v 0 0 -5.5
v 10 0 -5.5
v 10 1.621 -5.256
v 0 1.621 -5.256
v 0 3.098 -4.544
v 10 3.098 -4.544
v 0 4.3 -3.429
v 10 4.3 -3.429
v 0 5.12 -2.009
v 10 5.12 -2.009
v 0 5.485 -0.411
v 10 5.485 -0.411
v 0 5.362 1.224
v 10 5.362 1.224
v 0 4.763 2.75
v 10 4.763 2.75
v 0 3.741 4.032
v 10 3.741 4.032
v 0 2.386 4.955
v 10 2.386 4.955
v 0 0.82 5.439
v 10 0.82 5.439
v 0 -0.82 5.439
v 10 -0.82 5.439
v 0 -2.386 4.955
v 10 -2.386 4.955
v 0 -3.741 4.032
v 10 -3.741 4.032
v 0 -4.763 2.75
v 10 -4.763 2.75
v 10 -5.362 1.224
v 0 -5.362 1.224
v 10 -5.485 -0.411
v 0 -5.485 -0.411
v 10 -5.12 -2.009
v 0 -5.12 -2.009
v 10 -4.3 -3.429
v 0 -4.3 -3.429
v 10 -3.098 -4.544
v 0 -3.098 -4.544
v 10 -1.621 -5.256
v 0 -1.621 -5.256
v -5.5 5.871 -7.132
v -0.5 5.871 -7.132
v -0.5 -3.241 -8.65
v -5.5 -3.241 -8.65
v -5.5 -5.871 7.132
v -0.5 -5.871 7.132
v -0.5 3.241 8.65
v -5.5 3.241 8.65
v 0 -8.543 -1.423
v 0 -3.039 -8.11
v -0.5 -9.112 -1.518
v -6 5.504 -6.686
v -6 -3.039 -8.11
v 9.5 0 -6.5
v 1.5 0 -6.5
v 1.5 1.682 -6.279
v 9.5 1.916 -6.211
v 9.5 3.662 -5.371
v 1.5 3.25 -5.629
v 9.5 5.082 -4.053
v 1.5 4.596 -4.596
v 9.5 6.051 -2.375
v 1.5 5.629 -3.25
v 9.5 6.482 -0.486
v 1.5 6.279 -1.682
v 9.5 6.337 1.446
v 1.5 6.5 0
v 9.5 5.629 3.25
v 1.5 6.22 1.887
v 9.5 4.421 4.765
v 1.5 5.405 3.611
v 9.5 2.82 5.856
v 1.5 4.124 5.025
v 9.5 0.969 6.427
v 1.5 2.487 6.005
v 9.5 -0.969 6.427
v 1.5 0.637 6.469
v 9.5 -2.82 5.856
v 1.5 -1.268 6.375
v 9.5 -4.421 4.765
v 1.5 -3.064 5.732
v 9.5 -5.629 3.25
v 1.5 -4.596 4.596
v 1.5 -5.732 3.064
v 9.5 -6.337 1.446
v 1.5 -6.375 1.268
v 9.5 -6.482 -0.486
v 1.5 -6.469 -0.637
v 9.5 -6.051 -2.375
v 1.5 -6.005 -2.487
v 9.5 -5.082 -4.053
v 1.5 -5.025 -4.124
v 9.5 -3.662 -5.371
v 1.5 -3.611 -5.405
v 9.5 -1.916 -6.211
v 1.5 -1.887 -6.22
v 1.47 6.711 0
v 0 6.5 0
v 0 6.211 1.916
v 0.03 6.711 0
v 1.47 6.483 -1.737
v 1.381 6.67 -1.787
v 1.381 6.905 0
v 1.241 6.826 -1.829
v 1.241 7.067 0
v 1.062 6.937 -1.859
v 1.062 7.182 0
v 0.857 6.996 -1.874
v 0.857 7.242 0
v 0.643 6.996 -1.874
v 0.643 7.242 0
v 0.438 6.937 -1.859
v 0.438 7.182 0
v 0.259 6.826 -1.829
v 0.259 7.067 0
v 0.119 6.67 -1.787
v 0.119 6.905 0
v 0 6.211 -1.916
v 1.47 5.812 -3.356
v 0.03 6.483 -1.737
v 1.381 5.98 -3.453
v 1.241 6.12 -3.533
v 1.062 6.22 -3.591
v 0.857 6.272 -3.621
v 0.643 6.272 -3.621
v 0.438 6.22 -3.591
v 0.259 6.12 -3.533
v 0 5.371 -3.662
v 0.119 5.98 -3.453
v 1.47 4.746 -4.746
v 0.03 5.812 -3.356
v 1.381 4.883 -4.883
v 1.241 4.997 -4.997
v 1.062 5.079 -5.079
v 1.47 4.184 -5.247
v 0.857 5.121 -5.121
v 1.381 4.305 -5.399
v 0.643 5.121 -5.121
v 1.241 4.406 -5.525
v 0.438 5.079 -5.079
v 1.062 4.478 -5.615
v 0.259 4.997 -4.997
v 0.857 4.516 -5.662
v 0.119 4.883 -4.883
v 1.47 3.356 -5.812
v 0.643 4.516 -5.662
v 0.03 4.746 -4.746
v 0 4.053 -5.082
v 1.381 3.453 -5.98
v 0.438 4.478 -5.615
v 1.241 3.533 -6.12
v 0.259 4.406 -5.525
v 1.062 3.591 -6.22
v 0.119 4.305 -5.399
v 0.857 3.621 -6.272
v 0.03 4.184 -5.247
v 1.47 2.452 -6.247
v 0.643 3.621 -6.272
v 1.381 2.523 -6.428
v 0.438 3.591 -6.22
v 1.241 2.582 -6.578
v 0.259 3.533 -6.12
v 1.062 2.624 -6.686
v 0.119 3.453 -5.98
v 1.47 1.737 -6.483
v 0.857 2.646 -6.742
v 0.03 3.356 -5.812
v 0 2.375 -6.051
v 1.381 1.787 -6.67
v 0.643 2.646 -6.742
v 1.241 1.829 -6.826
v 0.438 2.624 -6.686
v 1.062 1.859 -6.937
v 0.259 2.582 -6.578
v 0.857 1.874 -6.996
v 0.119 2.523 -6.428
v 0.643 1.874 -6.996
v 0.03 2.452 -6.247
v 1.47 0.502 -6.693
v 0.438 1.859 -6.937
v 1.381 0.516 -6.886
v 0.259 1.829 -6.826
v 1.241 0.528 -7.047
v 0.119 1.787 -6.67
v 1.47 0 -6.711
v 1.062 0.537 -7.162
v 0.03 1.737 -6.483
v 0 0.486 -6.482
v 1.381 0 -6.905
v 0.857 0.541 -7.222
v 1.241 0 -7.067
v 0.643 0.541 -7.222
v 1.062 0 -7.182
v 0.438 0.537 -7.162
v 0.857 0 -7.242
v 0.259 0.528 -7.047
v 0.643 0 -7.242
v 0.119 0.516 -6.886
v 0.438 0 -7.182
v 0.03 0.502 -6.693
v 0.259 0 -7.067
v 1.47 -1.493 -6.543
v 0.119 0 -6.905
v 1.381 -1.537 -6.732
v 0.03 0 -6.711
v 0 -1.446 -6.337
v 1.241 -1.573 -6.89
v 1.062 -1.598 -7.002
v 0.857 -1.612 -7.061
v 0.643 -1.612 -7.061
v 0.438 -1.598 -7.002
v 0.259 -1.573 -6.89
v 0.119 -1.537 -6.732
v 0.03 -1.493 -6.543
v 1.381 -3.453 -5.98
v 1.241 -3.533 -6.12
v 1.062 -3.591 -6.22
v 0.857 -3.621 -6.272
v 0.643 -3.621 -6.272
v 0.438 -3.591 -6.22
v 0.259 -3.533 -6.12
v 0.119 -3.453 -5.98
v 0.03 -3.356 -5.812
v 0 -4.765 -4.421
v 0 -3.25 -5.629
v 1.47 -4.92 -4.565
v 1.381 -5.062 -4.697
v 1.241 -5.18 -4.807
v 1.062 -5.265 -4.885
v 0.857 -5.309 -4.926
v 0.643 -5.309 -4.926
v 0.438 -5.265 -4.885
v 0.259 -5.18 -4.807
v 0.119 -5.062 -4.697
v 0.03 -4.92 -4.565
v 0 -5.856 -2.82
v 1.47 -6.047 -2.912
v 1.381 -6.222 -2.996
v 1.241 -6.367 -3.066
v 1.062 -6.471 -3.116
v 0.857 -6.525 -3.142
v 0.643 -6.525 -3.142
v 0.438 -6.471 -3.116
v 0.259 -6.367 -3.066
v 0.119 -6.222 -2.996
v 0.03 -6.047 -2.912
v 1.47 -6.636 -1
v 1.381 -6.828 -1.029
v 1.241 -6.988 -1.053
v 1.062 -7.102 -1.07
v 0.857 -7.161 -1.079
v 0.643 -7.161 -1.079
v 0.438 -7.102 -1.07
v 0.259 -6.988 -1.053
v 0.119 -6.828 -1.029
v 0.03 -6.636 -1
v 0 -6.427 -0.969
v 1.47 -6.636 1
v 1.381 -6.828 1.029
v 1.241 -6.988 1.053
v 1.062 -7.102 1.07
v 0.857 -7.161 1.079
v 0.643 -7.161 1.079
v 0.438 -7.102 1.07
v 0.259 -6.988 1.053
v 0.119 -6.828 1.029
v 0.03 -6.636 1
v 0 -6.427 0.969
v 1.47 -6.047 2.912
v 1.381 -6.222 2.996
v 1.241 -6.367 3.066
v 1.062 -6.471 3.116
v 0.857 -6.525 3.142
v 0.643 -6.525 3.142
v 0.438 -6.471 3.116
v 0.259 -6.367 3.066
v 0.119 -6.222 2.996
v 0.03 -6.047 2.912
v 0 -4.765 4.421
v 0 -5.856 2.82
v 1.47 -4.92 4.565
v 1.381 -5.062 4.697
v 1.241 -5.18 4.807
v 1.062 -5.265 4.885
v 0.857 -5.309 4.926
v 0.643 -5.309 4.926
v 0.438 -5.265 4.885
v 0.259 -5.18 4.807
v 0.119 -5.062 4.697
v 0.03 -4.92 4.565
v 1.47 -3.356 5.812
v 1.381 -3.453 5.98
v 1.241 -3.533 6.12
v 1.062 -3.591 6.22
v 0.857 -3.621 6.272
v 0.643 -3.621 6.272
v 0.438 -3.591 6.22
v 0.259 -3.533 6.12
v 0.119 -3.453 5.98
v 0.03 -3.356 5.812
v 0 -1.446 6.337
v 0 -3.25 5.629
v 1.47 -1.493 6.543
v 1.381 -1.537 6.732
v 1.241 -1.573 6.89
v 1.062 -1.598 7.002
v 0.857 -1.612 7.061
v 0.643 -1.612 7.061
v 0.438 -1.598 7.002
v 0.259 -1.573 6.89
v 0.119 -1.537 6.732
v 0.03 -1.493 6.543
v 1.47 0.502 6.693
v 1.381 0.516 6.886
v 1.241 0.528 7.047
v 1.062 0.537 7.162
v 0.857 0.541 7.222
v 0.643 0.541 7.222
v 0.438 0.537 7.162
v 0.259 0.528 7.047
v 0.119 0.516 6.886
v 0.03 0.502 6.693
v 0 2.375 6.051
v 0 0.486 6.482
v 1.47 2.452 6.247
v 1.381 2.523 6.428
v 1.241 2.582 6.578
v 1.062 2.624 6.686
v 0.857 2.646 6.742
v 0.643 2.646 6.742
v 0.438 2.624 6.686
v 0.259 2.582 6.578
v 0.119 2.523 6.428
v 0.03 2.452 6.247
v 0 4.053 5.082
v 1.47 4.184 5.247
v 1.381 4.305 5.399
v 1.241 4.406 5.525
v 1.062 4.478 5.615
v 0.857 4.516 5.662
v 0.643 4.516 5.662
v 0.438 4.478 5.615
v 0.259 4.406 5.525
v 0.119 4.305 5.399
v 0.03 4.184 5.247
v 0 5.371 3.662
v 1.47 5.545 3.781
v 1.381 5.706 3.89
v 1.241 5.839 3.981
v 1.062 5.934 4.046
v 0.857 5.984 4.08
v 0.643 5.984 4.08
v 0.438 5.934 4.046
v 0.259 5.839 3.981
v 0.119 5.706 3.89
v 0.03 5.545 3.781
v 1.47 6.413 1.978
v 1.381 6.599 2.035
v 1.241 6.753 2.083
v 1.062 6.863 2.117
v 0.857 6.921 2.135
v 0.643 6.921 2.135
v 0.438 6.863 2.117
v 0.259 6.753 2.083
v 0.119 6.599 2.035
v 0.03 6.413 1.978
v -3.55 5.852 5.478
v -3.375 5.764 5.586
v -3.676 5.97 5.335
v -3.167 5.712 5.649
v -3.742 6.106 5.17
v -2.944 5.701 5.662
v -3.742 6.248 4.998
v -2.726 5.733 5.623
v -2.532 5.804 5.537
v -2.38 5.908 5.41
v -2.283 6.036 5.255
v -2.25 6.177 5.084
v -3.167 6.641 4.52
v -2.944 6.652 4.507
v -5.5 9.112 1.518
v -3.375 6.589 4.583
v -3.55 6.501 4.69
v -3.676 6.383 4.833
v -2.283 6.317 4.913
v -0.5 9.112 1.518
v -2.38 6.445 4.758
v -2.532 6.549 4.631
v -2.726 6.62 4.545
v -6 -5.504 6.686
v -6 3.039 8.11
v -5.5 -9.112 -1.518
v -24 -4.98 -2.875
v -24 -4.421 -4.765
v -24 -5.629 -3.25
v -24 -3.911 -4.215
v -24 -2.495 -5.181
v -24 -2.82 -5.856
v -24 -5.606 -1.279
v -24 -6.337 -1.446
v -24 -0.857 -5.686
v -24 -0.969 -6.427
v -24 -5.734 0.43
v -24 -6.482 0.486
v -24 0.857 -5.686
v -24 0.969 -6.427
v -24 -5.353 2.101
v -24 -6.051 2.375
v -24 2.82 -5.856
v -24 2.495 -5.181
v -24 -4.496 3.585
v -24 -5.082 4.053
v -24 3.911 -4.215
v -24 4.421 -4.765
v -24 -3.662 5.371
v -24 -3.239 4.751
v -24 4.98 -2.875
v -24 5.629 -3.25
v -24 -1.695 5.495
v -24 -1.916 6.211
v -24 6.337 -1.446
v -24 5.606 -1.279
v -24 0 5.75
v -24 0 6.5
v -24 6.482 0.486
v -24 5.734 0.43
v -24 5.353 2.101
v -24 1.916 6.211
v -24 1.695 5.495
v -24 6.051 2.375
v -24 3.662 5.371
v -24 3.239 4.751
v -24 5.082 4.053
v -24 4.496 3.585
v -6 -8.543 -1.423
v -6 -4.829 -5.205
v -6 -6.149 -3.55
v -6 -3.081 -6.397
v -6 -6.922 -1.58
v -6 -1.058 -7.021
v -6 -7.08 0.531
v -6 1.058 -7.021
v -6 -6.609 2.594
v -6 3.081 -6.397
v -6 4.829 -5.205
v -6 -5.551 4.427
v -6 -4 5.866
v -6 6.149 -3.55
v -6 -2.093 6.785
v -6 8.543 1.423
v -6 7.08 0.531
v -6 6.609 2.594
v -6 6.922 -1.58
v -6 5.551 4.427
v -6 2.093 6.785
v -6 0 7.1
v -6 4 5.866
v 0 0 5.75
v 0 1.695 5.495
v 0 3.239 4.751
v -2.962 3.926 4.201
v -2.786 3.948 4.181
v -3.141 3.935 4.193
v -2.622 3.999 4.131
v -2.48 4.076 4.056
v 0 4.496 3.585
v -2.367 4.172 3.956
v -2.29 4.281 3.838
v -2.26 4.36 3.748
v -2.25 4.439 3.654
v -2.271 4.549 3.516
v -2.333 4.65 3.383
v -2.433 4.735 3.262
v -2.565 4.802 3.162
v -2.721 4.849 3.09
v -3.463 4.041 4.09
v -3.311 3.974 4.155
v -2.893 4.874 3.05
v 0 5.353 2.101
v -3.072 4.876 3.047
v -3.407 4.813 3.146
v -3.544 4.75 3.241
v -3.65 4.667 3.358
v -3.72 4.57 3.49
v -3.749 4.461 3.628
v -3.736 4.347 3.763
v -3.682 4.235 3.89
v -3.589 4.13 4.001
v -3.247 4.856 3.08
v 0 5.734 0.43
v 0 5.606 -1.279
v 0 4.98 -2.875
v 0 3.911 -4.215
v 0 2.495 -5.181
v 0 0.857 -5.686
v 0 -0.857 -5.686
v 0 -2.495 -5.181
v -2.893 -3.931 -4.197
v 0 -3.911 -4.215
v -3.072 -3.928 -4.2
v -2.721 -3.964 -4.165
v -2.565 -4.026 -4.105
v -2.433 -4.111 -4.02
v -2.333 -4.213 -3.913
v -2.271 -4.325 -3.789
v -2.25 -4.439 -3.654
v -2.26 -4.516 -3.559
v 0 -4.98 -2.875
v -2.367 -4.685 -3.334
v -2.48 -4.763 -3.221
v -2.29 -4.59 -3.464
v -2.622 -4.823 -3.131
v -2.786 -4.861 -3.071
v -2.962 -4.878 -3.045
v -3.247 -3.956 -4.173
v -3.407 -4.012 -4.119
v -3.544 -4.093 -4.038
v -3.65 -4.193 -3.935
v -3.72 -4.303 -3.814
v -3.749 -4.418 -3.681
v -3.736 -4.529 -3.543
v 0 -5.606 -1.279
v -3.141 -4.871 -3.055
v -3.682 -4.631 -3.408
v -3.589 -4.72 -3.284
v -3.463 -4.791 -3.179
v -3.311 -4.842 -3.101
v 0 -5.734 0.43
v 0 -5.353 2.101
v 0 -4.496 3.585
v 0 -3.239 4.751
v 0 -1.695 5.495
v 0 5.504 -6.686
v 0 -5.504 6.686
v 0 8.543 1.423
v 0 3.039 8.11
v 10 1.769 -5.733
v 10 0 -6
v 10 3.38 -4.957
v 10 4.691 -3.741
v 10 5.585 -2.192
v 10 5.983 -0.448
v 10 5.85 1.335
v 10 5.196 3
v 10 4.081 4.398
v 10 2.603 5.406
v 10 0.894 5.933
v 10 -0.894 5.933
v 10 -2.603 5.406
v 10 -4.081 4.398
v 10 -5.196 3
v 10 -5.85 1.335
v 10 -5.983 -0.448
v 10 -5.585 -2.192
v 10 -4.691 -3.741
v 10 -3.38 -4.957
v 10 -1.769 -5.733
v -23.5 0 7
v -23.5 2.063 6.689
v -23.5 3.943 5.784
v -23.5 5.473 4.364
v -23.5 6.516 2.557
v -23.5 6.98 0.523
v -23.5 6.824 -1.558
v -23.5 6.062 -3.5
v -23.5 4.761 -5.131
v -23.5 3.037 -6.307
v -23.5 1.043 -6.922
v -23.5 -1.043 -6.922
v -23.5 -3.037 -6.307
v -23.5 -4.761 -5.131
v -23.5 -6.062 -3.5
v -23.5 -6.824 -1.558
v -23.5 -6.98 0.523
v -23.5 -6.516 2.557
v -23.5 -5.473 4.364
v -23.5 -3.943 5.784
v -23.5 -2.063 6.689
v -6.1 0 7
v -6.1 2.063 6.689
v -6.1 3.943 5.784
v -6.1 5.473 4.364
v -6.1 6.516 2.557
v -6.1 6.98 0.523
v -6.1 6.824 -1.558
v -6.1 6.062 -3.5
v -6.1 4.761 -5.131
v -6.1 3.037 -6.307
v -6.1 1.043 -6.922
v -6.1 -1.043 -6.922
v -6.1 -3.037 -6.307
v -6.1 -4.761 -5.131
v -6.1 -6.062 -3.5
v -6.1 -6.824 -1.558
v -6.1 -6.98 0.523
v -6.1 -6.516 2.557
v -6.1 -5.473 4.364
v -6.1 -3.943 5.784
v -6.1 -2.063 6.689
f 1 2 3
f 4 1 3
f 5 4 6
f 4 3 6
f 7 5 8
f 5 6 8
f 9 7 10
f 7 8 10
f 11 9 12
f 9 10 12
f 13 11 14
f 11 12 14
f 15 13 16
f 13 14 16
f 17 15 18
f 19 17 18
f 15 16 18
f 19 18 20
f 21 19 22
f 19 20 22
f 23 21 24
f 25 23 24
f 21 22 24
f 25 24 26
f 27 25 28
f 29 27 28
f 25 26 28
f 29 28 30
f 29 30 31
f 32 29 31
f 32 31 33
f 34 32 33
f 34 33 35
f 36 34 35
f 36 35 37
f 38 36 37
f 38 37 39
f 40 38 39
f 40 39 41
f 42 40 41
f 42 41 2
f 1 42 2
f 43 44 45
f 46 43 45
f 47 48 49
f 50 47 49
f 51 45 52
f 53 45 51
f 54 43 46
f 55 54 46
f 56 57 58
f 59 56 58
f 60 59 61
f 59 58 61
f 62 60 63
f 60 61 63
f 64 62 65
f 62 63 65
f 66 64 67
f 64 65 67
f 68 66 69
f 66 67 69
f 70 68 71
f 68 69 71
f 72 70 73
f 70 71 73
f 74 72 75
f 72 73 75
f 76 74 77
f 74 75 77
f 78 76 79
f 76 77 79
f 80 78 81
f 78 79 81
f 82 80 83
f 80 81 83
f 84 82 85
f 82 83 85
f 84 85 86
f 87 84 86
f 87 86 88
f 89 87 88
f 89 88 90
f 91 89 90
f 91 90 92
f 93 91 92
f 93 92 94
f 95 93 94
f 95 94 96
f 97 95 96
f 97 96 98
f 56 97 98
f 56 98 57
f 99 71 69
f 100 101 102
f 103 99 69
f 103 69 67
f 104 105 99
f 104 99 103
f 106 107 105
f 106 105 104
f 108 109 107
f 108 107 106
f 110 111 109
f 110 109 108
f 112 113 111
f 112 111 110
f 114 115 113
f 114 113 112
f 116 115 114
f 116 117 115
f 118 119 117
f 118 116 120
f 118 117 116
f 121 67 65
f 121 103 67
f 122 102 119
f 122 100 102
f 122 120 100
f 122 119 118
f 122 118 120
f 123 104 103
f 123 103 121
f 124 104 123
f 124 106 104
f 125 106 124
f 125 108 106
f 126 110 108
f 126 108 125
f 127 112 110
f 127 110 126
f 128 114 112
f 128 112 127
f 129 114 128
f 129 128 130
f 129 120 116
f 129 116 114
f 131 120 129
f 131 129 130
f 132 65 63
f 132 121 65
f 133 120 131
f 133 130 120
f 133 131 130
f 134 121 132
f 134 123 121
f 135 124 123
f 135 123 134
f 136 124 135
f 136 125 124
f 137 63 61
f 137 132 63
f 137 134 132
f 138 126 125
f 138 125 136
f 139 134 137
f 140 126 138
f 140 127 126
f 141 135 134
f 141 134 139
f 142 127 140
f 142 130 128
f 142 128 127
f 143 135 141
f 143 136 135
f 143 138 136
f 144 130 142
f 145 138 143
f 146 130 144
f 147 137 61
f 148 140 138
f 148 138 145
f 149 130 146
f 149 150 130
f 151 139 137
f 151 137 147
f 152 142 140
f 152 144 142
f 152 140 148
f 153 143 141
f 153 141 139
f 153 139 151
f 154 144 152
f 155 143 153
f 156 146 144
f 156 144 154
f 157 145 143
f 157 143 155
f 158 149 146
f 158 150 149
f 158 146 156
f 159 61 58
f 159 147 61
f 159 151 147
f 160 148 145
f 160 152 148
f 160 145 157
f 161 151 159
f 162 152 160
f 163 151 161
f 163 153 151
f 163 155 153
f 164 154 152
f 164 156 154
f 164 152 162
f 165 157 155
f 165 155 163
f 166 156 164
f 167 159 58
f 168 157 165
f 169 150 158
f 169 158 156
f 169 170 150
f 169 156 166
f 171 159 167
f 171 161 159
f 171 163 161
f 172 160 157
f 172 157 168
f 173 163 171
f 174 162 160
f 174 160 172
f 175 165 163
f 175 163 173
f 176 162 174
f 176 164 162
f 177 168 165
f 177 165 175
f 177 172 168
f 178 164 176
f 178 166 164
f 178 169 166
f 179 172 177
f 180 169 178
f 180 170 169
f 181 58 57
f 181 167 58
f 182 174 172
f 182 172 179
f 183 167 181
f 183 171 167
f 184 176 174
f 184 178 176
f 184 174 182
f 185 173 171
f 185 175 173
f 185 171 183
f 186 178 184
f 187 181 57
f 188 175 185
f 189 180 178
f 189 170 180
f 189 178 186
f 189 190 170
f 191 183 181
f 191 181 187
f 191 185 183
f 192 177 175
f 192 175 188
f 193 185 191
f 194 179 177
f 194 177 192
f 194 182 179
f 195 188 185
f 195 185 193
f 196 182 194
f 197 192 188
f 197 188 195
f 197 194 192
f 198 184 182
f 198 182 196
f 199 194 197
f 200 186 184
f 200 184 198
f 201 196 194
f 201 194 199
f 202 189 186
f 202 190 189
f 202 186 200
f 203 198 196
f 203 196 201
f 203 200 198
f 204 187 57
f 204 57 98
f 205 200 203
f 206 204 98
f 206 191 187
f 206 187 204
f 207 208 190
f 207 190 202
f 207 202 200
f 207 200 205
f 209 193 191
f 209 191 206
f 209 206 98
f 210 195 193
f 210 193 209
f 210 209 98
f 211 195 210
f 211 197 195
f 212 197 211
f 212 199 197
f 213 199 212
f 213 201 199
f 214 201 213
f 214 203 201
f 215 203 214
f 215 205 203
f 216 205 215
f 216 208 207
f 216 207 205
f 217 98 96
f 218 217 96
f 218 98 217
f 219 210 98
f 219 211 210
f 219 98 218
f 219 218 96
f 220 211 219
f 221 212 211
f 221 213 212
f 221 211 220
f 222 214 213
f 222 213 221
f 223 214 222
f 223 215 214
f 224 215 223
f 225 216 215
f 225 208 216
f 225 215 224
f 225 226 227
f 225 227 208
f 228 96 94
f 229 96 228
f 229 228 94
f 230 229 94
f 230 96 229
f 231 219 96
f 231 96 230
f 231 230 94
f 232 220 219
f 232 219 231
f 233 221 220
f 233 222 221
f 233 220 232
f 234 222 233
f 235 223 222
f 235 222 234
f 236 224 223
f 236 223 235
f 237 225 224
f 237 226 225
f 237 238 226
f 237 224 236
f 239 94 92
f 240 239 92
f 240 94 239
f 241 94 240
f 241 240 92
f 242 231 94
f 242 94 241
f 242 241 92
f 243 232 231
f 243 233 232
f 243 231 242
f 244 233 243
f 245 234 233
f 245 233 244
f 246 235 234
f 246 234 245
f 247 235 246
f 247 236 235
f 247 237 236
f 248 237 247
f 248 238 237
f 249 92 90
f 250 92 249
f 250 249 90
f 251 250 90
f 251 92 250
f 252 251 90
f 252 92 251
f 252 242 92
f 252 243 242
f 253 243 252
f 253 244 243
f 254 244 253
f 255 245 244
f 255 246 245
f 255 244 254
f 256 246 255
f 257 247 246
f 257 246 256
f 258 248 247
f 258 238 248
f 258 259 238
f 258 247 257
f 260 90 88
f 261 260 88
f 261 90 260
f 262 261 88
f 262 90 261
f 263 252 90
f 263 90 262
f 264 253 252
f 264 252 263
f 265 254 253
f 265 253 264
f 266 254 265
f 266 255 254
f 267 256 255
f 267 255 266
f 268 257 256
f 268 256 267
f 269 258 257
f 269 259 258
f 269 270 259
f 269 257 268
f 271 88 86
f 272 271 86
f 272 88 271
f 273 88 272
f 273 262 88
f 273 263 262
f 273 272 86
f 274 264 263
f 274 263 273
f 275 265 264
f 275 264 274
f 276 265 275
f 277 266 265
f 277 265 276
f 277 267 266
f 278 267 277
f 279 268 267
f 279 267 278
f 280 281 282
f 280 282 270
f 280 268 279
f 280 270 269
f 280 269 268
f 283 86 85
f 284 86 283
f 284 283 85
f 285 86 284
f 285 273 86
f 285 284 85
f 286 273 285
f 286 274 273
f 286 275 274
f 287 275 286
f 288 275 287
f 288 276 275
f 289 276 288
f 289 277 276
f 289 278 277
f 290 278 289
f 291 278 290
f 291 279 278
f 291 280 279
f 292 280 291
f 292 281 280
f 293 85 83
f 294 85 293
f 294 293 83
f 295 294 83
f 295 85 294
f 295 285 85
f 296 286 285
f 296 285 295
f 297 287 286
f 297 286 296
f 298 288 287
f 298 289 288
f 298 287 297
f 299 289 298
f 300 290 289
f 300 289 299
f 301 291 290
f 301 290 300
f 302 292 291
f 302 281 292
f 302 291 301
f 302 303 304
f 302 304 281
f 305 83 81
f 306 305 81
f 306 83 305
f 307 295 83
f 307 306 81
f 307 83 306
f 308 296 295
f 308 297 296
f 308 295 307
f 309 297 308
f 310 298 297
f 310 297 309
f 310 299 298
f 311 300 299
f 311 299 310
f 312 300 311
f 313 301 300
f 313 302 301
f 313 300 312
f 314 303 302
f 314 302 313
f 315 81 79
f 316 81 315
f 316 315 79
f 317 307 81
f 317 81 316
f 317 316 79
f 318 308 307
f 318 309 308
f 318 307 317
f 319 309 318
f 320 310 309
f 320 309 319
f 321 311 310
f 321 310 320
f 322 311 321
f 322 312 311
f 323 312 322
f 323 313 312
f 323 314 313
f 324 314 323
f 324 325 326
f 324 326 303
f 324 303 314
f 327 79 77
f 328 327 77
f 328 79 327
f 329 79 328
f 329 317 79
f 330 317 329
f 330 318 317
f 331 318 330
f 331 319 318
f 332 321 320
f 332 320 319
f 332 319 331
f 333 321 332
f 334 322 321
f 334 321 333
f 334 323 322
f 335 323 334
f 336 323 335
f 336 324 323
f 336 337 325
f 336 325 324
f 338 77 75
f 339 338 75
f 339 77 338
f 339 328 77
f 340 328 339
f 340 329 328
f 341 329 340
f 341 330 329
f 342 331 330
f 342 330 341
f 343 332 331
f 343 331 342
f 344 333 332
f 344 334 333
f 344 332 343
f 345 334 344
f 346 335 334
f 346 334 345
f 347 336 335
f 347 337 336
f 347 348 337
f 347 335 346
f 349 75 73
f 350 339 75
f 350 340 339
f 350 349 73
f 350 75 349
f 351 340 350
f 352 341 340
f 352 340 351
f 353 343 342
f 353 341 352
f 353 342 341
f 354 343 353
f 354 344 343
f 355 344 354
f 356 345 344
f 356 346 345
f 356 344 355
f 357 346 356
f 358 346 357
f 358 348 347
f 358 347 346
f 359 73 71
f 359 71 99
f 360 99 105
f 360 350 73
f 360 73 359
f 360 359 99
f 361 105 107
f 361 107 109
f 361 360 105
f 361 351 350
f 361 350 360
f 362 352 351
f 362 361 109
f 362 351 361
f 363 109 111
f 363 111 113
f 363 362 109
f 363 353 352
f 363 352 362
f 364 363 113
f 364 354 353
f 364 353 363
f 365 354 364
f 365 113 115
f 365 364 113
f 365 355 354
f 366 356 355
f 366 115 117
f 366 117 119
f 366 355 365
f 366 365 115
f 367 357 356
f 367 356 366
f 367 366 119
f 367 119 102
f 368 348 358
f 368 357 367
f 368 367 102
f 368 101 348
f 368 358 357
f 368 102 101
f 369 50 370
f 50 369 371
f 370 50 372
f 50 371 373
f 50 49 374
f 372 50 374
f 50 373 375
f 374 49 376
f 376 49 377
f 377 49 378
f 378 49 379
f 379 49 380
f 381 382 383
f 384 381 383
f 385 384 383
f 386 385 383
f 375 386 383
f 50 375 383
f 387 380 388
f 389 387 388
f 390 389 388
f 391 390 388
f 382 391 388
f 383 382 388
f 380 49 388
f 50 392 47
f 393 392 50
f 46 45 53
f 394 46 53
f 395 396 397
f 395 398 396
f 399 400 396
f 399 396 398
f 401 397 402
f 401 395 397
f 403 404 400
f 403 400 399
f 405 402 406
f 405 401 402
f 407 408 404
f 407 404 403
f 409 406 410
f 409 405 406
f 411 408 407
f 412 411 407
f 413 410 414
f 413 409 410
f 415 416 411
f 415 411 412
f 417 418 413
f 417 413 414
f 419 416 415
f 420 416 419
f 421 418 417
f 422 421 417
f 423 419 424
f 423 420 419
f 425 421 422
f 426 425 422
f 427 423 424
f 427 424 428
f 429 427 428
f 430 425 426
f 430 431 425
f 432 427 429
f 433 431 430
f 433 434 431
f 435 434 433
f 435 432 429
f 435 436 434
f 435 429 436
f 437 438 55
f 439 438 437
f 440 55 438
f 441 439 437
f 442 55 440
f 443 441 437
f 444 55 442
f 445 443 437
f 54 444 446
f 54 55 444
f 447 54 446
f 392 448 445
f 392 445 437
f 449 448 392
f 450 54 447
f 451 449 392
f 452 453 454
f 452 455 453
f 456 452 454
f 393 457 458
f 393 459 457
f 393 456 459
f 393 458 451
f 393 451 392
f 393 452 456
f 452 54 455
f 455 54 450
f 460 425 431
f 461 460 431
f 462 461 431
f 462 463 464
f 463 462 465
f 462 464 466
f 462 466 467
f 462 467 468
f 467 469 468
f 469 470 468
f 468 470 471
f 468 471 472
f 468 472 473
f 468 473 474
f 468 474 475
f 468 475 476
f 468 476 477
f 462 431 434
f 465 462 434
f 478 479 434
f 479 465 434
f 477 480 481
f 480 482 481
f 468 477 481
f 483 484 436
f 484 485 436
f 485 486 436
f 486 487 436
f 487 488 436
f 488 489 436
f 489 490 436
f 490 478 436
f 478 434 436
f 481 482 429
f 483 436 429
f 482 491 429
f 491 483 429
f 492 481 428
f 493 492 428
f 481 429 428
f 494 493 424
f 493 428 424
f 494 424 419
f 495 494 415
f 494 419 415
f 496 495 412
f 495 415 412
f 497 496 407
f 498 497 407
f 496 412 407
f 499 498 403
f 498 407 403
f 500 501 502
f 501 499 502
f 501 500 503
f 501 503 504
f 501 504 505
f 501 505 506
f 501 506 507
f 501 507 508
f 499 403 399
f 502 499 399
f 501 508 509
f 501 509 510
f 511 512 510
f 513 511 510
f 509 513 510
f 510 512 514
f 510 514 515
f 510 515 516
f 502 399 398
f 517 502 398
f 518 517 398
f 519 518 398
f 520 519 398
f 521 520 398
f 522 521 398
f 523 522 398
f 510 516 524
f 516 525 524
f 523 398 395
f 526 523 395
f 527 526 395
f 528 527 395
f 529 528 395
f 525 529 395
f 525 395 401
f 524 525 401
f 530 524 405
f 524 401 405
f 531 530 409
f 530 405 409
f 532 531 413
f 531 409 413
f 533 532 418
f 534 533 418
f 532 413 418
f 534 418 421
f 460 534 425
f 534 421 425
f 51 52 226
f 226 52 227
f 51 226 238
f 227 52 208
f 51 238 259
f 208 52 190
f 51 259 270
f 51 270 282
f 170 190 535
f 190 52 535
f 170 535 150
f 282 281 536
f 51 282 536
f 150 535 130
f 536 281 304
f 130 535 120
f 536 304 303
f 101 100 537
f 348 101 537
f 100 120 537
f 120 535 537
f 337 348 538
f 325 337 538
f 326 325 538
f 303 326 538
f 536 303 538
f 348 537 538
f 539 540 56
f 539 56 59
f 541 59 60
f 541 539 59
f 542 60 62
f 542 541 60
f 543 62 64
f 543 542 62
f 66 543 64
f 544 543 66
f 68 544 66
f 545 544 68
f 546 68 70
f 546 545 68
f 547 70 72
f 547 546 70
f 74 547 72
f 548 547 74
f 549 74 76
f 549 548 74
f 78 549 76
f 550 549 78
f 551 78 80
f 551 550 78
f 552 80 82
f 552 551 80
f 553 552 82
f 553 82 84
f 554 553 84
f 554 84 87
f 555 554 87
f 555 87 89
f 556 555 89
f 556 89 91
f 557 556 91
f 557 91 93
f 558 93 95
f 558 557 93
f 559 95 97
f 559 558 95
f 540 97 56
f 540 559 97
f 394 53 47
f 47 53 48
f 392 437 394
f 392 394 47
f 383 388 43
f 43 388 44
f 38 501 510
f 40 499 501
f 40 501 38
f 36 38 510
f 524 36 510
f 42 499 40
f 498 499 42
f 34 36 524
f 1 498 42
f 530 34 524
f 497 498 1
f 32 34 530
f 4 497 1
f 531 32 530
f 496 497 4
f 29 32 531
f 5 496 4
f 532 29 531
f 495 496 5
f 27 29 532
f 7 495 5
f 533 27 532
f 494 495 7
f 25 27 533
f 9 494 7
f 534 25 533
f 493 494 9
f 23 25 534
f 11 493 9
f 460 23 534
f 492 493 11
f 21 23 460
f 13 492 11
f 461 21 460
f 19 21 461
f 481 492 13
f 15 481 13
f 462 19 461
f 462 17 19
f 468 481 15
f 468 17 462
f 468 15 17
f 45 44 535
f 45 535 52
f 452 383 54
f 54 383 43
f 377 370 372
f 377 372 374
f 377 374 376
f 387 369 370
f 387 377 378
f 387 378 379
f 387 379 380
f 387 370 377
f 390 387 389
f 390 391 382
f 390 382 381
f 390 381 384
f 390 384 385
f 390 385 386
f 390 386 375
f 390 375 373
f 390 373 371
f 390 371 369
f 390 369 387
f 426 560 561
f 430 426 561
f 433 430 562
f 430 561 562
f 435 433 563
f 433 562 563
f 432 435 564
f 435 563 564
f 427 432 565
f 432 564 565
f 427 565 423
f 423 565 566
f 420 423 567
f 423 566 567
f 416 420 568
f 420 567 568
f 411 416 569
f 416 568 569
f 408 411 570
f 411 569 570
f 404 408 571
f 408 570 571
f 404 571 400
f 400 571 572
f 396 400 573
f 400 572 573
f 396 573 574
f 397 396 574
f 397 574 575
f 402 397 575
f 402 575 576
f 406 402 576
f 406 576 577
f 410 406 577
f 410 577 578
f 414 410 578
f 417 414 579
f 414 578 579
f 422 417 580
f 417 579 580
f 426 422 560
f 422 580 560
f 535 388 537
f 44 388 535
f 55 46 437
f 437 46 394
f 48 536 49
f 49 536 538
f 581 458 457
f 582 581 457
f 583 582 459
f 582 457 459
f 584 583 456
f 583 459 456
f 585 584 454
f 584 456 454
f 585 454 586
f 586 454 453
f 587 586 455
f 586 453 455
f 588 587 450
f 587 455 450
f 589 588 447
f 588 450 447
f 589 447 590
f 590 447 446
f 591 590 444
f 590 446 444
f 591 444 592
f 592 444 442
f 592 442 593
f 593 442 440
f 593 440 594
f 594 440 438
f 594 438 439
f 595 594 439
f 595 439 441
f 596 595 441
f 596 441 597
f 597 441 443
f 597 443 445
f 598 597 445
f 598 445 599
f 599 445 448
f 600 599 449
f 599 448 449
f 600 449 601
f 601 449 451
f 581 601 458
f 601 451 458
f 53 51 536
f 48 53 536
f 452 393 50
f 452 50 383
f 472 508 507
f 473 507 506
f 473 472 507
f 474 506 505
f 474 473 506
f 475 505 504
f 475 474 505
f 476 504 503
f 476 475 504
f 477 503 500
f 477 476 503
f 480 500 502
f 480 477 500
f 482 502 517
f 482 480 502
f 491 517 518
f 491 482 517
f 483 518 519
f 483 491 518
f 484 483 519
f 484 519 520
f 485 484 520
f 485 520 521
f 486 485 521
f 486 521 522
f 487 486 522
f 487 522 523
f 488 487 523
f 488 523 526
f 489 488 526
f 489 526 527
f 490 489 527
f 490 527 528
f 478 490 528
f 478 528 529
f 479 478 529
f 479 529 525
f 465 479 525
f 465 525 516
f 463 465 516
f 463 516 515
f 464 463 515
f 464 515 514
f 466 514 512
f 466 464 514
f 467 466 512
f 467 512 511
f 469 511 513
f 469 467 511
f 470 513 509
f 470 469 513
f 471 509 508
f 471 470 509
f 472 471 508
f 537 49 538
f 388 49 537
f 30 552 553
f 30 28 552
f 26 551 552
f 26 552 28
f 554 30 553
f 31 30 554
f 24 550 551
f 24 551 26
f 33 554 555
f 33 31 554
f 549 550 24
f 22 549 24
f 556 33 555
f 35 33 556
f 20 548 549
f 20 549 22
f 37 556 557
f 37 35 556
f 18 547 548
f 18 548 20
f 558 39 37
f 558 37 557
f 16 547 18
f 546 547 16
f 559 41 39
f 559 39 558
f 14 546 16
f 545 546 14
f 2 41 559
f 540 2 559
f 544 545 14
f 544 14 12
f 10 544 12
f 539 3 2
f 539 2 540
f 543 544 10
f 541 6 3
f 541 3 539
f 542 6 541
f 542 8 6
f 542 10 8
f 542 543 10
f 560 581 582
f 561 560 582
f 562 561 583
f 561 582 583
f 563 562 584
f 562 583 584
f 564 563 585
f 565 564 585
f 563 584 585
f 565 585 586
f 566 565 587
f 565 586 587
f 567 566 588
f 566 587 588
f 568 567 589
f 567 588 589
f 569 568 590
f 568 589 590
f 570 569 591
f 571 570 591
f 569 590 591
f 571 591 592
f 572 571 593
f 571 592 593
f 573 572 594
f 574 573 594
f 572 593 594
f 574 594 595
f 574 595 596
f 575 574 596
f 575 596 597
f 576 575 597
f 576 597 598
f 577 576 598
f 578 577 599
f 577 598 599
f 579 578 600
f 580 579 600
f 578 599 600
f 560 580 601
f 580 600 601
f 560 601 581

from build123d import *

# Parameters (mm, degrees)
ESQUISSE1_R             = 0.65
BOSS_EXTRU_1_DEPTH      = 1
BOSS_EXTRU_2_DEPTH      = 0.6
ESQUISSE4_R             = 0.7
BOSS_EXTRU_3_DEPTH      = 1.8
CHANFREIN1_SIZE         = 0.05
CHANFREIN2_SIZE         = 0.05
ESQUISSE5_R             = 0.575
ENL_V_MAT_EXTRU_1_DEPTH = 2.4
ESQUISSE6_R             = 0.55
ENL_V_MAT_EXTRU_2_DEPTH = 2.4
CHANFREIN3_SIZE         = 0.05
CHANFREIN4_SIZE         = 0.05
CHANFREIN5_SIZE         = 0.01
ESQUISSE7_R             = 0.075
BOSS_EXTRU_4_DEPTH      = 1.5
ECHELLE1_SCALE          = 10


with BuildPart() as part:
    # Esquisse1 → Boss.-Extru.1 (new body)
    with BuildSketch(Plane(origin=(0, 0, 0), x_dir=(0, 0, -1), z_dir=(1, 0, 0))):
        Circle(ESQUISSE1_R)
    extrude(amount=BOSS_EXTRU_1_DEPTH)

    # Esquisse2 → Révolution1 (revolve)
    with BuildSketch(Plane.XY):
        with BuildLine():
            Line((0, 0.65), (0.15, 0.65))
            ThreePointArc((0.15, 0.65), (0.075, 0.725), (0, 0.65))
        make_face()
    revolve(axis=Axis((1, 0, 0), (-1, 0, 0)))

    # Esquisse3 → Boss.-Extru.2 (add)
    with BuildSketch(Plane.ZY):
        Polygon((0.713221279, -0.587067918), (0.86502637, 0.324133787), (0.151805091, 0.911201705), (-0.713221279, 0.587067918), (-0.86502637, -0.324133787), (-0.151805091, -0.911201705), align=None)
    extrude(amount=BOSS_EXTRU_2_DEPTH)

    # Esquisse4 → Boss.-Extru.3 (add)
    with BuildSketch(Plane.ZY.offset(0.6)):
        Circle(ESQUISSE4_R)
    extrude(amount=BOSS_EXTRU_3_DEPTH)

    # Chanfrein1
    chanfrein1_edges = [part.edges().sort_by_distance(p)[0] for p in [
        (-0.6, -0.749134812, 0.280708094),
        (-0.6, -0.131467065, 0.789123825),
        (-0.6, 0.617667746, 0.508415731),
        (-0.6, 0.749134812, -0.280708094),
        (-0.6, 0.131467065, -0.789123825),
        (-0.6, -0.617667746, -0.508415731),
    ]]
    chamfer(chanfrein1_edges, length=CHANFREIN1_SIZE)

    # Chanfrein2
    chanfrein2_edges = [part.edges().sort_by_distance(p)[0] for p in [
        (0, 0.749134812, -0.280708094),
        (0, 0.131467065, -0.789123825),
        (0, -0.617667746, -0.508415731),
        (0, -0.749134812, 0.280708094),
        (0, -0.131467065, 0.789123825),
        (0, 0.617667746, 0.508415731),
    ]]
    chamfer(chanfrein2_edges, length=CHANFREIN2_SIZE)

    # Esquisse5 → Enlèv. mat.-Extru.1 (cut)
    with BuildSketch(Plane.ZY.offset(2.4)):
        Circle(ESQUISSE5_R)
    extrude(amount=-ENL_V_MAT_EXTRU_1_DEPTH, mode=Mode.SUBTRACT)

    # Esquisse6 → Enlèv. mat.-Extru.2 (cut)
    with BuildSketch(Plane(origin=(1, 0, 0), x_dir=(0, 0, -1), z_dir=(1, 0, 0))):
        Circle(ESQUISSE6_R)
    extrude(amount=-ENL_V_MAT_EXTRU_2_DEPTH, mode=Mode.SUBTRACT)

    # Chanfrein3
    chanfrein3_edges = [part.edges().sort_by_distance(p)[0] for p in [
        (1, 0, 0.65),
    ]]
    chamfer(chanfrein3_edges, length=CHANFREIN3_SIZE)

    # Chanfrein4
    chanfrein4_edges = [part.edges().sort_by_distance(p)[0] for p in [
        (-2.4, 0, -0.7),
    ]]
    chamfer(chanfrein4_edges, length=CHANFREIN4_SIZE)

    # Chanfrein5
    chanfrein5_edges = [part.edges().sort_by_distance(p)[0] for p in [
        (-0.6, 0, -0.7),
    ]]
    chamfer(chanfrein5_edges, length=CHANFREIN5_SIZE)

    # Esquisse7 → Boss.-Extru.4 (add)
    with BuildSketch(Plane(origin=(0, 0.617667746, 0.508415731), x_dir=(1, 0, 0), z_dir=(0, 0.772084683, 0.635519663))):
        with Locations((-0.3, 0)):
            Circle(ESQUISSE7_R)
    extrude(amount=-BOSS_EXTRU_4_DEPTH)


with BuildPart() as part_1:
    # Echelle1: scaled about (0, 0, 0)
    add(part.part.scale(ECHELLE1_SCALE))


solid = part_1.part
